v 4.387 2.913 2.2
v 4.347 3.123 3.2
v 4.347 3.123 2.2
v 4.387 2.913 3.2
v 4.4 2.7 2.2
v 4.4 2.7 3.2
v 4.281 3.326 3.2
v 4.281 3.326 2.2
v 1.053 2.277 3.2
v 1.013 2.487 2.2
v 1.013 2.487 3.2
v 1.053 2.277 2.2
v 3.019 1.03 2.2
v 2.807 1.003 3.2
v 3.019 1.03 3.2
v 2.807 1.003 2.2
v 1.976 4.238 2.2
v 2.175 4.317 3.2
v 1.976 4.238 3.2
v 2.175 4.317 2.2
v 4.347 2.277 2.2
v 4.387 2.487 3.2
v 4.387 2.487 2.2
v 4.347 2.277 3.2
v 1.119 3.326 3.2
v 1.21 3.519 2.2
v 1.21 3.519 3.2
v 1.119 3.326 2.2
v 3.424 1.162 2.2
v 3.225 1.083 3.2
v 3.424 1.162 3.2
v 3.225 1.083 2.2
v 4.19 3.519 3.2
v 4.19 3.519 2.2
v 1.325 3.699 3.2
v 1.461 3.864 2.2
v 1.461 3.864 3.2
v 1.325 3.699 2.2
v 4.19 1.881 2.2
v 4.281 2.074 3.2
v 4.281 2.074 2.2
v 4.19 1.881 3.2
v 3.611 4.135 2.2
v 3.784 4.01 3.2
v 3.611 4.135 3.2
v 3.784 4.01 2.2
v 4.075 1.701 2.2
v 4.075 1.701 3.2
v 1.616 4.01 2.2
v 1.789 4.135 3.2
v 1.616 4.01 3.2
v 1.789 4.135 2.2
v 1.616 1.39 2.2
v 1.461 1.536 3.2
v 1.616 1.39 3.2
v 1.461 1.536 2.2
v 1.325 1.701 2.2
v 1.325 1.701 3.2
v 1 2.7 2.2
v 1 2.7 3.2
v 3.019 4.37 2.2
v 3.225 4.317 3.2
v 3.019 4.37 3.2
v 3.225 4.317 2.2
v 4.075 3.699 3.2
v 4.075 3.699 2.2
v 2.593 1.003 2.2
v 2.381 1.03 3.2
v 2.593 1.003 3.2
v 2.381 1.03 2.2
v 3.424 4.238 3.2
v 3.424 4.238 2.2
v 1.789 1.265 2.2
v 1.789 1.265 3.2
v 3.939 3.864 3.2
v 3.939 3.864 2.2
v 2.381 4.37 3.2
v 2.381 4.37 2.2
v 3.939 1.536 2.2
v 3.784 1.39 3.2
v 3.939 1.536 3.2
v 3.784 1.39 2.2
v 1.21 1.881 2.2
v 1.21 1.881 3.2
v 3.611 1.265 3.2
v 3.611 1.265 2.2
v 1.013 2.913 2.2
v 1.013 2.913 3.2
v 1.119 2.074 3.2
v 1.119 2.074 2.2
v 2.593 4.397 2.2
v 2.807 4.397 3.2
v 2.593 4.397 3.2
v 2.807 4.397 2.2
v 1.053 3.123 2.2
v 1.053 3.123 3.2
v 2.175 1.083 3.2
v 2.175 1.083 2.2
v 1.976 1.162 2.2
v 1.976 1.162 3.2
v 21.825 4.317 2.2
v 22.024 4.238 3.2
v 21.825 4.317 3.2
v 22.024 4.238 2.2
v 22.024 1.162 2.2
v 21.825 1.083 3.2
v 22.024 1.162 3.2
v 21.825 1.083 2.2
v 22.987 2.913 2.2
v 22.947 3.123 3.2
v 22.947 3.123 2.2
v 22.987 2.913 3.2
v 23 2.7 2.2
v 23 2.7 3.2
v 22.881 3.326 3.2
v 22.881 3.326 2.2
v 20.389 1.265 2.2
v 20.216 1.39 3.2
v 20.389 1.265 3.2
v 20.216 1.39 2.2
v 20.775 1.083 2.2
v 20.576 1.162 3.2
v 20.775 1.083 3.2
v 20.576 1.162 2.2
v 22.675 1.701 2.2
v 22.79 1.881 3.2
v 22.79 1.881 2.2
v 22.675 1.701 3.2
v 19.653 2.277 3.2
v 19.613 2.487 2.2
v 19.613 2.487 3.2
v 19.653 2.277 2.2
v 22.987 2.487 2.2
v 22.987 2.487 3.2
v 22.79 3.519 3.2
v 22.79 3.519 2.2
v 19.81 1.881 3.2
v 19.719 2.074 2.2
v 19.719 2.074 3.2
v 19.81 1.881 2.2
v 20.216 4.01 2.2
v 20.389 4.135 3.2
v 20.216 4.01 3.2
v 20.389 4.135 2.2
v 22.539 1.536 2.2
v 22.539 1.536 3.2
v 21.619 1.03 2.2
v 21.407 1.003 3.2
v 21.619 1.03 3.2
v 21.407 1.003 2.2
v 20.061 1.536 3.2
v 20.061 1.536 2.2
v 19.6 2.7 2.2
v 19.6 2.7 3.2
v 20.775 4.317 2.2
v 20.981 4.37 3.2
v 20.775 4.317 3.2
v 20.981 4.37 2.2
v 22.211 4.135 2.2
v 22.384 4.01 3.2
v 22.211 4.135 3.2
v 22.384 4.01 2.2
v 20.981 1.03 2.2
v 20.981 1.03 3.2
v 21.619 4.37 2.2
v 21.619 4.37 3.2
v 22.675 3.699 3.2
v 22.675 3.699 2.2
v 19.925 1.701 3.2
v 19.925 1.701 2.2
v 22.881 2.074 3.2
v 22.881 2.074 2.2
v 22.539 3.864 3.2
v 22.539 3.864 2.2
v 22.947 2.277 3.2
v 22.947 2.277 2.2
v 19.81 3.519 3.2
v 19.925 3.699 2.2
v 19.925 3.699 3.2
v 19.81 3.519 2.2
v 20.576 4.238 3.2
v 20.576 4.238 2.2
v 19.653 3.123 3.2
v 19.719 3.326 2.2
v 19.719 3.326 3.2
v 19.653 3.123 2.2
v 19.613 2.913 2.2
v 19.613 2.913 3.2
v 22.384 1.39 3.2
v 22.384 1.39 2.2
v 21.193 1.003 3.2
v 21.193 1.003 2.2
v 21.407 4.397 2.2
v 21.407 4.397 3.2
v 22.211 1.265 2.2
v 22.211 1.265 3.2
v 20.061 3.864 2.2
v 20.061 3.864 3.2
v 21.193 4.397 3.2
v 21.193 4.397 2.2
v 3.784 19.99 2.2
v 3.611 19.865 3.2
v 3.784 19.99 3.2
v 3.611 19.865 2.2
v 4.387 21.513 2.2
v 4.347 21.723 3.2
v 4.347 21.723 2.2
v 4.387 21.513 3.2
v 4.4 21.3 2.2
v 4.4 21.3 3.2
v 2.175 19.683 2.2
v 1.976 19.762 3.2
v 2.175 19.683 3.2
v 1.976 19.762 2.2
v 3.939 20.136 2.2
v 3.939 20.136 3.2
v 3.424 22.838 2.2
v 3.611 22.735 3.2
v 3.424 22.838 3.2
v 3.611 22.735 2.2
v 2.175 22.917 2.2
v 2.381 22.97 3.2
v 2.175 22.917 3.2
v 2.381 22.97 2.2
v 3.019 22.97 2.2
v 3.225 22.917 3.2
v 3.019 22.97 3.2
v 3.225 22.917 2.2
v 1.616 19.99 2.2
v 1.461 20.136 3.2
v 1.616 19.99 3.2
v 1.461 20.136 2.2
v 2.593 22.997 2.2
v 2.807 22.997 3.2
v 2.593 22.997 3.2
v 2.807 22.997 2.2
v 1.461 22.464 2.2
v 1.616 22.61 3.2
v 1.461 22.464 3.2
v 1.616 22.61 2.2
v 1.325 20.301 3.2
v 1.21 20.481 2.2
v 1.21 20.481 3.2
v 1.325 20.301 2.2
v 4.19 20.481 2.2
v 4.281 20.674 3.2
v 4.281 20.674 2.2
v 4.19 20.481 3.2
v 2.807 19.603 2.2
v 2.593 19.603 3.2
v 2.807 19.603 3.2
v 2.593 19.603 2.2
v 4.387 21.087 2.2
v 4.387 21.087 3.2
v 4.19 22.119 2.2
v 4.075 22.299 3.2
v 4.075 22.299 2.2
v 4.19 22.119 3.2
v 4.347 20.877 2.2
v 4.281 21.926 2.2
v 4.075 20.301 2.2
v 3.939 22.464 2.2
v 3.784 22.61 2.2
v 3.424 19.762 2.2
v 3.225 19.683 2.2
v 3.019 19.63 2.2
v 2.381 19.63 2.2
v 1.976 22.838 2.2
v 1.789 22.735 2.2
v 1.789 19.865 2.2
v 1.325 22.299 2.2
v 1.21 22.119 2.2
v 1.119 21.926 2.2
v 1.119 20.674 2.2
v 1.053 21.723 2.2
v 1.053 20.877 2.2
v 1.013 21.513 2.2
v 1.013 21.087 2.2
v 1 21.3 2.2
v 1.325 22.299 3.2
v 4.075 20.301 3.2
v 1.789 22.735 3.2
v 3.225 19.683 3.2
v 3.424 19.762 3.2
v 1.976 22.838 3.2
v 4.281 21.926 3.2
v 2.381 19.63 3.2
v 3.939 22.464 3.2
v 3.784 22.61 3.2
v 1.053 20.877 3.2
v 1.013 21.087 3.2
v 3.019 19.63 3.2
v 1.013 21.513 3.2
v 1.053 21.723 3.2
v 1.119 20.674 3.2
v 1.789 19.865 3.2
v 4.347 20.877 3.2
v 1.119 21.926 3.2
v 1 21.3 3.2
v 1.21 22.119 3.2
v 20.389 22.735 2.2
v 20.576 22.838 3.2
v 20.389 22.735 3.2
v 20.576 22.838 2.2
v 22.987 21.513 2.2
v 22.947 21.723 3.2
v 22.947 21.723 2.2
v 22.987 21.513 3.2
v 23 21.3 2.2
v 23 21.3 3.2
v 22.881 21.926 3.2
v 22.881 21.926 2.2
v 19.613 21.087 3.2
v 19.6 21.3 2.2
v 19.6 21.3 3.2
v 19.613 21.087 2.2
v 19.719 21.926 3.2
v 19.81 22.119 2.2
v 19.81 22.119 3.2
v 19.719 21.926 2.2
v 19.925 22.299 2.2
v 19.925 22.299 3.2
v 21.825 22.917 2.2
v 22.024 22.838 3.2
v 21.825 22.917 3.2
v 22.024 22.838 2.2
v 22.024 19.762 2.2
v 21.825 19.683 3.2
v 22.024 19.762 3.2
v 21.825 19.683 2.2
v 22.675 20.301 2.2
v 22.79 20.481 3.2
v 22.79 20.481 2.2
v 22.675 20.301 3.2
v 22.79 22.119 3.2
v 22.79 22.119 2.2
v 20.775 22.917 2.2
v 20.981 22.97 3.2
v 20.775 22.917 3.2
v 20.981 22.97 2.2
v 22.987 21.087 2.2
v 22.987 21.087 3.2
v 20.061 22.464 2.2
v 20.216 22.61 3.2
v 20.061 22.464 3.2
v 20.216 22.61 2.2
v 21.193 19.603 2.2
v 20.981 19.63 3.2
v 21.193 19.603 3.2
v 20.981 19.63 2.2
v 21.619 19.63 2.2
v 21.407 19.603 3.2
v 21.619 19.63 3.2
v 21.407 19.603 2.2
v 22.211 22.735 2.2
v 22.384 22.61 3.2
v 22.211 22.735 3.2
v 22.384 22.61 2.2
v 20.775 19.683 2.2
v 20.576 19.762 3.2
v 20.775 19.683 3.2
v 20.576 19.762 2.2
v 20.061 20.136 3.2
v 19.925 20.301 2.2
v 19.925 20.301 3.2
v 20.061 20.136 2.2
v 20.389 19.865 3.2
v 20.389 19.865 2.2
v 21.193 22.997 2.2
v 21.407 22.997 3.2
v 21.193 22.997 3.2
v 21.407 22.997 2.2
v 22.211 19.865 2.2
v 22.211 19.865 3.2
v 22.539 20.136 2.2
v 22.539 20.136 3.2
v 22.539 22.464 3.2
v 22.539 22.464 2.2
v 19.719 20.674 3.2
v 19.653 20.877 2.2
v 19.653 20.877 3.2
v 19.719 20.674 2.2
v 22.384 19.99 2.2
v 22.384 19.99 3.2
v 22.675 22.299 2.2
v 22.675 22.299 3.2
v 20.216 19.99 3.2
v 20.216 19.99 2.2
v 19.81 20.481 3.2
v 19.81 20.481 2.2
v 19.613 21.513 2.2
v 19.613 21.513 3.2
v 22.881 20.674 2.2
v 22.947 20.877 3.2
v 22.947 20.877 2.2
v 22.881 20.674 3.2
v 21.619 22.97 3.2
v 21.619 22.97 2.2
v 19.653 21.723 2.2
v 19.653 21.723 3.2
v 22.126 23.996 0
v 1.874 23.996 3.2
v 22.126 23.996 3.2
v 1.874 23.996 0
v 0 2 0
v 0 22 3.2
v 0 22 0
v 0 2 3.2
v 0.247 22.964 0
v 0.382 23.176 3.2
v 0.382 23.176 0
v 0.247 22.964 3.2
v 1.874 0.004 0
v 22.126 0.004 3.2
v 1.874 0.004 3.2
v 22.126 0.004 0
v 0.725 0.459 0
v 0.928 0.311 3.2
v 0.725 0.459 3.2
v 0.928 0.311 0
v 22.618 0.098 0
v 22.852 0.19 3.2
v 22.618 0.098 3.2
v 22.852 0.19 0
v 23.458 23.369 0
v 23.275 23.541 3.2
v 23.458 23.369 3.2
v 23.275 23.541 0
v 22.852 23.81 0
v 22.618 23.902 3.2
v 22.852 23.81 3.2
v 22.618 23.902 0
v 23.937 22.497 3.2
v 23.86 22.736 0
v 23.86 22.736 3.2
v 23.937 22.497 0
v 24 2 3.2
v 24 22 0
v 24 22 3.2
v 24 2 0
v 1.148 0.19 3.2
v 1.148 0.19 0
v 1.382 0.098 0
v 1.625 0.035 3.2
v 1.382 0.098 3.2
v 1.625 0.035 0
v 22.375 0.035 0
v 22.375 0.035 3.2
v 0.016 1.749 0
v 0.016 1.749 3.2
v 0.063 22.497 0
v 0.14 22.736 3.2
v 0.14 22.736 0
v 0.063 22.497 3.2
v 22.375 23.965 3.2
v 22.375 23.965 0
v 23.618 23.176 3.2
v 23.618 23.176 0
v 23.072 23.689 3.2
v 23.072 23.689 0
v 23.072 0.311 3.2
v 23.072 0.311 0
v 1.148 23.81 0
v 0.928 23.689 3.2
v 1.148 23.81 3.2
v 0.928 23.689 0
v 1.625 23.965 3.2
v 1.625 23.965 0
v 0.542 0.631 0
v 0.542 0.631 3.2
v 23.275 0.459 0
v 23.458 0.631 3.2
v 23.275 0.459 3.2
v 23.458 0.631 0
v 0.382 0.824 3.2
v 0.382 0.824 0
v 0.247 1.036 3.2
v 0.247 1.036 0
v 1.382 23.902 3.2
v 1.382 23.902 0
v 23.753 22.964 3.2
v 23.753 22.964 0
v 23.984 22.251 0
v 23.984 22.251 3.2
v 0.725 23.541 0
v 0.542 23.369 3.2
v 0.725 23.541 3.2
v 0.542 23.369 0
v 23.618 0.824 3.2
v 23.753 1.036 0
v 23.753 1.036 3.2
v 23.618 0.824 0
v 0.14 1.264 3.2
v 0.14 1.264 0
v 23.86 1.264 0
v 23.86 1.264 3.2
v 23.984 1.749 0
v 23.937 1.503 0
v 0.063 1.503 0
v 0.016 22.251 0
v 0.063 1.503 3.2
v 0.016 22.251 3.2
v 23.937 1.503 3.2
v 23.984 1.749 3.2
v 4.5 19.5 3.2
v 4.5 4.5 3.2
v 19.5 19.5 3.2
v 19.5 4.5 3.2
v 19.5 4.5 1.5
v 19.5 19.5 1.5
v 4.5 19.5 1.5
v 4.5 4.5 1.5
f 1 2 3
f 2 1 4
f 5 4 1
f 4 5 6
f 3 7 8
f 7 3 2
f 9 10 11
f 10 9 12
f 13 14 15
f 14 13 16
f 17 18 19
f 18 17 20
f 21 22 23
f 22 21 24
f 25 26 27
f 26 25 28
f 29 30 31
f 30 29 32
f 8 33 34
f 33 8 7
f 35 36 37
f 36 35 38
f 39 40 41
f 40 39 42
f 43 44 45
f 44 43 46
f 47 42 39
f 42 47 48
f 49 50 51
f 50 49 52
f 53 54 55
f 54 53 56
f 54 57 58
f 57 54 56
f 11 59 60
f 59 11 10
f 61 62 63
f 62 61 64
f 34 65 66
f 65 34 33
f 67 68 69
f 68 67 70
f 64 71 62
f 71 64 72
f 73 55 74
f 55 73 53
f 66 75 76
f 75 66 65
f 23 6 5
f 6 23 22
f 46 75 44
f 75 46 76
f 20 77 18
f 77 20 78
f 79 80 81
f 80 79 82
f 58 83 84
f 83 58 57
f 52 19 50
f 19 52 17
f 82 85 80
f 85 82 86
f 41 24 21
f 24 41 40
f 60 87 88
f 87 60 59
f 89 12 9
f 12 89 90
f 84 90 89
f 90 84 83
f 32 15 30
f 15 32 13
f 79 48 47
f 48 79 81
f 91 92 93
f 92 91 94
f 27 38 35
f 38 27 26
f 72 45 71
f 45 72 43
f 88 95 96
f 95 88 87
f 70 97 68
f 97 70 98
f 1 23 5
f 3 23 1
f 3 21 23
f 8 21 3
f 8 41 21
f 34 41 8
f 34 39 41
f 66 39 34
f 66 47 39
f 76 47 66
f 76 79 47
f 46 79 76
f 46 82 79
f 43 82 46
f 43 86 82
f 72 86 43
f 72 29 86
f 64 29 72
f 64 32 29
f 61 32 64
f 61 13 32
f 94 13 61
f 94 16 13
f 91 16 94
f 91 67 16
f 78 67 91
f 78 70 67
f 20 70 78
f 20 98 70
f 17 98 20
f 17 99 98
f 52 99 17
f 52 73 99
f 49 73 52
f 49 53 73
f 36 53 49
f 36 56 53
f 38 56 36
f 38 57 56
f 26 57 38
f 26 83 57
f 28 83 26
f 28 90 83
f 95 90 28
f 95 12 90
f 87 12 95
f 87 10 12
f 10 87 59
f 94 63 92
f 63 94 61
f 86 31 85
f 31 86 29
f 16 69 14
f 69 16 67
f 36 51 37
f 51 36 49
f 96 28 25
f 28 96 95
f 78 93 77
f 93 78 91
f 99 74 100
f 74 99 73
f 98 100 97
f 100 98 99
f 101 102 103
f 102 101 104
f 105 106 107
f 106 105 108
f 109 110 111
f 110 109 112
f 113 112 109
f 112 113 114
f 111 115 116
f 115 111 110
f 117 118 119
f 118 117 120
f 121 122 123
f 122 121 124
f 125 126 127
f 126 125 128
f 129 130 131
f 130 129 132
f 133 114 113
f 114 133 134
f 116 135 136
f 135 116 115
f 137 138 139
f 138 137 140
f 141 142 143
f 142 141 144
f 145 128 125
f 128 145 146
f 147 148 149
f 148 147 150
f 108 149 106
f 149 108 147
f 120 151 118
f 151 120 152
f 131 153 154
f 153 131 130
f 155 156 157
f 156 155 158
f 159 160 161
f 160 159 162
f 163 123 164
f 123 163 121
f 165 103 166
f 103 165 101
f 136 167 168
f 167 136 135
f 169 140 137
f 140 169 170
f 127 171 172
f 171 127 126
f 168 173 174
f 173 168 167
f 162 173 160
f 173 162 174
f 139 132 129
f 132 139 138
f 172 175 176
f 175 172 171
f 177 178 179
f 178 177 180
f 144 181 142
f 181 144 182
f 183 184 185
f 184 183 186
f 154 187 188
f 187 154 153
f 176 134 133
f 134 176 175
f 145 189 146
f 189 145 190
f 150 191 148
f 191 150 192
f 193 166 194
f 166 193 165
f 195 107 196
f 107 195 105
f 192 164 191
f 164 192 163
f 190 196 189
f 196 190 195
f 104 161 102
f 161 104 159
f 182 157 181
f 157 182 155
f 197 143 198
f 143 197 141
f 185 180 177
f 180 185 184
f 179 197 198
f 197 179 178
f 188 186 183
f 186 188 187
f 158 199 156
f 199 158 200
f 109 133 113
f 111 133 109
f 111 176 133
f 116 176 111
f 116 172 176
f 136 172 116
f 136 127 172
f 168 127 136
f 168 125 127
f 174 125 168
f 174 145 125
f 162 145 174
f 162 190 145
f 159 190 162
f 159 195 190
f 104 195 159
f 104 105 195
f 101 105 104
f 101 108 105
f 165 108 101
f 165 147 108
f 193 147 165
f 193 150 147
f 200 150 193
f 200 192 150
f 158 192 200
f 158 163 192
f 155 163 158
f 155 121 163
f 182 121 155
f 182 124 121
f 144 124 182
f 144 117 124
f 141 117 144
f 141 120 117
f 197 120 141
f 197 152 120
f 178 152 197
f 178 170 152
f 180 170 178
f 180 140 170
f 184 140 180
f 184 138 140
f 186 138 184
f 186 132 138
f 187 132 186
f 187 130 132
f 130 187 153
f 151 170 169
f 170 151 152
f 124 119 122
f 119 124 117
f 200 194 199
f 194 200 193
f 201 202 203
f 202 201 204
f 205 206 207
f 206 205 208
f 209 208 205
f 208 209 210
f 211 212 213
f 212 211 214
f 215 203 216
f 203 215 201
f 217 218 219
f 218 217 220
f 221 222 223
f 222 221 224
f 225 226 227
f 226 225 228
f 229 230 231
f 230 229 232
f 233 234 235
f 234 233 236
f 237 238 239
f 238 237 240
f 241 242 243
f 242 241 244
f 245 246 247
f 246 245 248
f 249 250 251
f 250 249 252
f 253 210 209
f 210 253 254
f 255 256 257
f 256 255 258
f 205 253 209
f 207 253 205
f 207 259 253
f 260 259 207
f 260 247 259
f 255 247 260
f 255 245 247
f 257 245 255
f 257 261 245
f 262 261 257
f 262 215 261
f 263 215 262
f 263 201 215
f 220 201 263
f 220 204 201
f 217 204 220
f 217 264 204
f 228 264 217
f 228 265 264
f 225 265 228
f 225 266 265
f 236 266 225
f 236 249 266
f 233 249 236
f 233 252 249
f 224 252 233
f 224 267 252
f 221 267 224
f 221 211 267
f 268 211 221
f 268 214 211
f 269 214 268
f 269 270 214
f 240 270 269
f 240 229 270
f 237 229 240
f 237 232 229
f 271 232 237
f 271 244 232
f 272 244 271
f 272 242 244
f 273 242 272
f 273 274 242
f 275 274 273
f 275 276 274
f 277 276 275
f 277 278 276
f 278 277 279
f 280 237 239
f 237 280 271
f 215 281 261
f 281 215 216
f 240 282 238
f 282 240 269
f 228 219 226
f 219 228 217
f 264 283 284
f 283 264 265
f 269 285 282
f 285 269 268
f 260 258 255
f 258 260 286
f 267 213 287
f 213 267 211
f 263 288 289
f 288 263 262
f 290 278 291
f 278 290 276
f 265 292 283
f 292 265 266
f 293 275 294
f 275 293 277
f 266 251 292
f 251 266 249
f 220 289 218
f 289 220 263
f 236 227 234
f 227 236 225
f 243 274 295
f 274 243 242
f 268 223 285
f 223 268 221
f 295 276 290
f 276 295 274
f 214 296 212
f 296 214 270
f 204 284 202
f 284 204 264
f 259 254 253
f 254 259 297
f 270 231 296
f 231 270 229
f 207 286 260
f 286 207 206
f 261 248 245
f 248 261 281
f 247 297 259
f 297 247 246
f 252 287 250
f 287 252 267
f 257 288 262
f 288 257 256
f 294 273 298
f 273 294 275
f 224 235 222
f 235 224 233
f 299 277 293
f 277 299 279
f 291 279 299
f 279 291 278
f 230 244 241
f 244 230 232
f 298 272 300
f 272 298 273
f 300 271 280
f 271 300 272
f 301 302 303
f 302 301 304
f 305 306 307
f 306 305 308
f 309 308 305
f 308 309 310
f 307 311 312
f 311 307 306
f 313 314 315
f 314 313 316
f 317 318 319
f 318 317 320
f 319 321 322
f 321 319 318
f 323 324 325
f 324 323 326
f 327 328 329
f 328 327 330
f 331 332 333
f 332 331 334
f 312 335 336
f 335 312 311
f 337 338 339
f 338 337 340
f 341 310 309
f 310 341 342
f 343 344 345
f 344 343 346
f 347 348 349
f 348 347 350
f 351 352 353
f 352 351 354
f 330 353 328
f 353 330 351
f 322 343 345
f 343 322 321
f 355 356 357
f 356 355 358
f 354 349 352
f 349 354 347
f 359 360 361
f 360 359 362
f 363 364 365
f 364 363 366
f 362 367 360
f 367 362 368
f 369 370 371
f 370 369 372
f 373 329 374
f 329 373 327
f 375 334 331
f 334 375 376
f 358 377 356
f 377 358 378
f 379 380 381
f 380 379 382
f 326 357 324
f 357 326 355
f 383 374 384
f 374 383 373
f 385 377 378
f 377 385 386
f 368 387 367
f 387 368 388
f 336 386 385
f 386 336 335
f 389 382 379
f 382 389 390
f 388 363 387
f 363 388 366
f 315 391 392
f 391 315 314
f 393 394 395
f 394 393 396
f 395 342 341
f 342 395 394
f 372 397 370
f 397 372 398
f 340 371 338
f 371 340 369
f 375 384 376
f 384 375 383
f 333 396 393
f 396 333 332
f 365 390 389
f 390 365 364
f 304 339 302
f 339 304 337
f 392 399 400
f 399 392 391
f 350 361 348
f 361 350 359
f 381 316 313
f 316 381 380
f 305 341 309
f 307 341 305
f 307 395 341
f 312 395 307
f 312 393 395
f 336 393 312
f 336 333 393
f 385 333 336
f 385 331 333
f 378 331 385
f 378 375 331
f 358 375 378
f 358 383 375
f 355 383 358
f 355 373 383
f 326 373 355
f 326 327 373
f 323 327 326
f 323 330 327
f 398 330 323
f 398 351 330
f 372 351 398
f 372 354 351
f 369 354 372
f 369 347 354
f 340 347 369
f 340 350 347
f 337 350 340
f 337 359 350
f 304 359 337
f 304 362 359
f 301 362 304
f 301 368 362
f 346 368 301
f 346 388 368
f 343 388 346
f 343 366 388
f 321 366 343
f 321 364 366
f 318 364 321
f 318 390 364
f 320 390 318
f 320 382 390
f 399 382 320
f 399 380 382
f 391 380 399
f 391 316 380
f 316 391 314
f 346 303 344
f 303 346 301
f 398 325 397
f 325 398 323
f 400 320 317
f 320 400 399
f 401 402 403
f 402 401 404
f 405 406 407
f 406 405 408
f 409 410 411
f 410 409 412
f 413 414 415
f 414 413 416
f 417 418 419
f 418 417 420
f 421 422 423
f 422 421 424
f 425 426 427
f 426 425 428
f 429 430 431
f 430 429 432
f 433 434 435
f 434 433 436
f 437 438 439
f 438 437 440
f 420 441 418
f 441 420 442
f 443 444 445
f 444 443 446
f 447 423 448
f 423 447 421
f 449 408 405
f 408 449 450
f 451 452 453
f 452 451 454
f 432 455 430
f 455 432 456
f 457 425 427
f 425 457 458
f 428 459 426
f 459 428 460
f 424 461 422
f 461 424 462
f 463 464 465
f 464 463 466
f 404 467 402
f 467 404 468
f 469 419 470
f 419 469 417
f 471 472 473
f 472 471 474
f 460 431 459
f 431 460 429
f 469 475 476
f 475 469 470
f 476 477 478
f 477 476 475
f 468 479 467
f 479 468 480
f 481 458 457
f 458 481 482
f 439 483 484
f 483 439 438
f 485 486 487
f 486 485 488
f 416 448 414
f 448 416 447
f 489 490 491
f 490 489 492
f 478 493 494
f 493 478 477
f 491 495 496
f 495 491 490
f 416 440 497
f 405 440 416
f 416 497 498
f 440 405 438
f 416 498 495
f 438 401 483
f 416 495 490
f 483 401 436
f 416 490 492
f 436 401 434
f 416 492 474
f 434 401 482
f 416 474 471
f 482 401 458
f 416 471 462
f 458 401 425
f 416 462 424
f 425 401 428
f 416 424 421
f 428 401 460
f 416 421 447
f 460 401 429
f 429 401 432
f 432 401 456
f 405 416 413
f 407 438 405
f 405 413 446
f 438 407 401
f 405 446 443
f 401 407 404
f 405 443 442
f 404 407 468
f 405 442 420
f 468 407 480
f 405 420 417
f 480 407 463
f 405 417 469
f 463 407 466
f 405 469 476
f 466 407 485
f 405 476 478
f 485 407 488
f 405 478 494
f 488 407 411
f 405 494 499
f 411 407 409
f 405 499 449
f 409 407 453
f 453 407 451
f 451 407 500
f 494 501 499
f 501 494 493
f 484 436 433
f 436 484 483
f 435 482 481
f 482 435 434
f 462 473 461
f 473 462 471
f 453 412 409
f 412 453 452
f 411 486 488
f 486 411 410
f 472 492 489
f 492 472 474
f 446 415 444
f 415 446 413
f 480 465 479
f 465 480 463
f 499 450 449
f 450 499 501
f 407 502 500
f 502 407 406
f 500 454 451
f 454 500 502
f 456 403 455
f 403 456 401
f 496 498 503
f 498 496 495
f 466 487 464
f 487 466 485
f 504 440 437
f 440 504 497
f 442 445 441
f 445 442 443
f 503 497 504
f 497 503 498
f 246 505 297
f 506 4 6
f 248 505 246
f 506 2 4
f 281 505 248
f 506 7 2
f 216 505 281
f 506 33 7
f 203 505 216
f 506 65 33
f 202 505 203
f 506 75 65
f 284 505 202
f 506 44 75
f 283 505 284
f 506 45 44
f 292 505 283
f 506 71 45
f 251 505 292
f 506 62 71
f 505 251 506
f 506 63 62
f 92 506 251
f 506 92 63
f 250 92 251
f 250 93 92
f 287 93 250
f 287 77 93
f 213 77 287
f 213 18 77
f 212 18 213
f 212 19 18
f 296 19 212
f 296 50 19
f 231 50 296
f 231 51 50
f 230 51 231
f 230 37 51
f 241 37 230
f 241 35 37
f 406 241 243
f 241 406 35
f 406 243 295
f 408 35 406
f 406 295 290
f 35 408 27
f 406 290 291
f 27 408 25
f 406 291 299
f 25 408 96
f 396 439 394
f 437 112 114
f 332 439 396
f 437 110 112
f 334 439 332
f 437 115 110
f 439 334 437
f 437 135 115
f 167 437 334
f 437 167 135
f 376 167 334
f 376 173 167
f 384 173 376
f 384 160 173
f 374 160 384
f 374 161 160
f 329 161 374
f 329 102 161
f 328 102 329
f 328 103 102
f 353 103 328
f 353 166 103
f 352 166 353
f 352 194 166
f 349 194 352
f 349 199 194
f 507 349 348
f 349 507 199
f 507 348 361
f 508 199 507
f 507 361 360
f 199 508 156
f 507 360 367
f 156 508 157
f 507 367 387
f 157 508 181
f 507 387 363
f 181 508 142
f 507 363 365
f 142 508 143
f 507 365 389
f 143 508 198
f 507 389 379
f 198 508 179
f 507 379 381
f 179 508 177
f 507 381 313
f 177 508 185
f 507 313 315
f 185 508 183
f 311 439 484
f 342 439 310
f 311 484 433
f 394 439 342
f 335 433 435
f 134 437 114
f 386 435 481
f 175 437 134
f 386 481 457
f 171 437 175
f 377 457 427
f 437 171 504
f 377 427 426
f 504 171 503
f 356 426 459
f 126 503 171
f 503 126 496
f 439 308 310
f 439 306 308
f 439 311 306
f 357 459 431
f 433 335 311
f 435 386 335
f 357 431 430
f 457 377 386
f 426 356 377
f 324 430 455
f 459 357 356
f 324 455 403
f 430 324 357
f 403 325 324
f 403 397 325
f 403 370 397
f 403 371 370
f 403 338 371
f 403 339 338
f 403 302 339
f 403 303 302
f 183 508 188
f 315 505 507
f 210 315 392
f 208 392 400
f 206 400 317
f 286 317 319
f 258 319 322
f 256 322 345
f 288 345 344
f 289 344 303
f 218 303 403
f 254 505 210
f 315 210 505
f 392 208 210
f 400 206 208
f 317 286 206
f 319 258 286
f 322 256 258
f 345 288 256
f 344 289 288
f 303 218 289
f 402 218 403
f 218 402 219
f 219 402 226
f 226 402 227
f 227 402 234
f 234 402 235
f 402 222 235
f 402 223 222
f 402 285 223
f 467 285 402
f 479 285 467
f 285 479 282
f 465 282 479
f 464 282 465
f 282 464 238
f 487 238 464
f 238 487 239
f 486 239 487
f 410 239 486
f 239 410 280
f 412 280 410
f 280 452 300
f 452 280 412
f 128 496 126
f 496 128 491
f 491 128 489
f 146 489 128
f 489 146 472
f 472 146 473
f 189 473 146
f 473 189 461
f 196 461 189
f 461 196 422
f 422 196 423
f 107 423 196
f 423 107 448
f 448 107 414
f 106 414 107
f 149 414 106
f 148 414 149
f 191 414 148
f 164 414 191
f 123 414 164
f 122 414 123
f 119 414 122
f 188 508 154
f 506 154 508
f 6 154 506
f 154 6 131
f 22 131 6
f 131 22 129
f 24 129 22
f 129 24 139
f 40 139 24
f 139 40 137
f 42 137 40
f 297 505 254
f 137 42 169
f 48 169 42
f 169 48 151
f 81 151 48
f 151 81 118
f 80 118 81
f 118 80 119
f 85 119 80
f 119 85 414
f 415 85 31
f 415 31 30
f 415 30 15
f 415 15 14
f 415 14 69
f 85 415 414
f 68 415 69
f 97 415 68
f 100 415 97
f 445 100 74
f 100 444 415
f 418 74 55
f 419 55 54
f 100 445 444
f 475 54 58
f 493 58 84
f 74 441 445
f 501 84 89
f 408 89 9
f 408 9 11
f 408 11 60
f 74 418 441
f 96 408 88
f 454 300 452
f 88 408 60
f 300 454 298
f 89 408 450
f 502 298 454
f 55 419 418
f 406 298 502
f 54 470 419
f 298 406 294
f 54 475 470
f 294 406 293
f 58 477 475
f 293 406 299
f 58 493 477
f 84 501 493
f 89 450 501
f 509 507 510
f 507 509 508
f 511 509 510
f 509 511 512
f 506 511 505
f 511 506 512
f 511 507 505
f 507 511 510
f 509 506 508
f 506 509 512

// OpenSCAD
// file: ../../lib/flat_rounded_cube.scad
$bleed = 1;
$rounding = 3;

min_cylinder_height = 1;

module flat_rounded_cube(size) {
  width = size[0] - $rounding * 2;
  length = size[1] - $rounding * 2;

  // Only 1 count of min_cynlinder_height not 2;
  // cylinder does not extend the bottom because it's flush
  height = size[2] - min_cylinder_height; 

  minkowski() {
    translate([$rounding, $rounding, 0]) {
      cube([width, length, height]);
    }
    cylinder(min_cylinder_height, $rounding, $rounding);
  }
}
// main file
echo(version=version());

include <../../lib/flat_rounded_cube.scad>

// Config
$fn = 50;
$bleed = 1;
$rounding = 2;

// Attributes
inset = 1;
magnet_height = 1;
magnet_diameter = 3.4;
corner_magnet_buffer = 1;
border_width = 4.5;
card_width = 15;
card_length = 15;
card_height = 0.7;

// Derived Attributes
card_size = [
  card_width,
  card_length,
  card_height + inset + $bleed
];

base_height = magnet_height + 0.5;
height = base_height + card_height + inset;
corner_magnet_offset = corner_magnet_buffer + magnet_diameter / 2;

base_size = [
  card_size[0] + border_width*2,
  card_size[1] + border_width*2,
  height
];

card_offset = [
  (base_size[0] - card_size[0]) / 2,
  (base_size[1] - card_size[1]) / 2,
  0
];

corner_hole_offsets = [
  [corner_magnet_offset, corner_magnet_offset],
  [base_size[0] - corner_magnet_offset, corner_magnet_offset],
  [corner_magnet_offset, base_size[1] - corner_magnet_offset],
  [base_size[0] - corner_magnet_offset, base_size[1] - corner_magnet_offset],
];

// Model
difference() {
  // Base
  flat_rounded_cube(base_size);
  translate([0, 0, height-magnet_height]) {
    // Cut out corner magnet holes
    for (i=corner_hole_offsets) {
      translate([i[0], i[1], 0]) {
        cylinder(h=magnet_height + $bleed, d=magnet_diameter);
      }
    }
  }
  translate(card_offset) {
    // Cut out for card
    translate([0, 0, base_height]) {
      cube(card_size);
    }
  }
}
